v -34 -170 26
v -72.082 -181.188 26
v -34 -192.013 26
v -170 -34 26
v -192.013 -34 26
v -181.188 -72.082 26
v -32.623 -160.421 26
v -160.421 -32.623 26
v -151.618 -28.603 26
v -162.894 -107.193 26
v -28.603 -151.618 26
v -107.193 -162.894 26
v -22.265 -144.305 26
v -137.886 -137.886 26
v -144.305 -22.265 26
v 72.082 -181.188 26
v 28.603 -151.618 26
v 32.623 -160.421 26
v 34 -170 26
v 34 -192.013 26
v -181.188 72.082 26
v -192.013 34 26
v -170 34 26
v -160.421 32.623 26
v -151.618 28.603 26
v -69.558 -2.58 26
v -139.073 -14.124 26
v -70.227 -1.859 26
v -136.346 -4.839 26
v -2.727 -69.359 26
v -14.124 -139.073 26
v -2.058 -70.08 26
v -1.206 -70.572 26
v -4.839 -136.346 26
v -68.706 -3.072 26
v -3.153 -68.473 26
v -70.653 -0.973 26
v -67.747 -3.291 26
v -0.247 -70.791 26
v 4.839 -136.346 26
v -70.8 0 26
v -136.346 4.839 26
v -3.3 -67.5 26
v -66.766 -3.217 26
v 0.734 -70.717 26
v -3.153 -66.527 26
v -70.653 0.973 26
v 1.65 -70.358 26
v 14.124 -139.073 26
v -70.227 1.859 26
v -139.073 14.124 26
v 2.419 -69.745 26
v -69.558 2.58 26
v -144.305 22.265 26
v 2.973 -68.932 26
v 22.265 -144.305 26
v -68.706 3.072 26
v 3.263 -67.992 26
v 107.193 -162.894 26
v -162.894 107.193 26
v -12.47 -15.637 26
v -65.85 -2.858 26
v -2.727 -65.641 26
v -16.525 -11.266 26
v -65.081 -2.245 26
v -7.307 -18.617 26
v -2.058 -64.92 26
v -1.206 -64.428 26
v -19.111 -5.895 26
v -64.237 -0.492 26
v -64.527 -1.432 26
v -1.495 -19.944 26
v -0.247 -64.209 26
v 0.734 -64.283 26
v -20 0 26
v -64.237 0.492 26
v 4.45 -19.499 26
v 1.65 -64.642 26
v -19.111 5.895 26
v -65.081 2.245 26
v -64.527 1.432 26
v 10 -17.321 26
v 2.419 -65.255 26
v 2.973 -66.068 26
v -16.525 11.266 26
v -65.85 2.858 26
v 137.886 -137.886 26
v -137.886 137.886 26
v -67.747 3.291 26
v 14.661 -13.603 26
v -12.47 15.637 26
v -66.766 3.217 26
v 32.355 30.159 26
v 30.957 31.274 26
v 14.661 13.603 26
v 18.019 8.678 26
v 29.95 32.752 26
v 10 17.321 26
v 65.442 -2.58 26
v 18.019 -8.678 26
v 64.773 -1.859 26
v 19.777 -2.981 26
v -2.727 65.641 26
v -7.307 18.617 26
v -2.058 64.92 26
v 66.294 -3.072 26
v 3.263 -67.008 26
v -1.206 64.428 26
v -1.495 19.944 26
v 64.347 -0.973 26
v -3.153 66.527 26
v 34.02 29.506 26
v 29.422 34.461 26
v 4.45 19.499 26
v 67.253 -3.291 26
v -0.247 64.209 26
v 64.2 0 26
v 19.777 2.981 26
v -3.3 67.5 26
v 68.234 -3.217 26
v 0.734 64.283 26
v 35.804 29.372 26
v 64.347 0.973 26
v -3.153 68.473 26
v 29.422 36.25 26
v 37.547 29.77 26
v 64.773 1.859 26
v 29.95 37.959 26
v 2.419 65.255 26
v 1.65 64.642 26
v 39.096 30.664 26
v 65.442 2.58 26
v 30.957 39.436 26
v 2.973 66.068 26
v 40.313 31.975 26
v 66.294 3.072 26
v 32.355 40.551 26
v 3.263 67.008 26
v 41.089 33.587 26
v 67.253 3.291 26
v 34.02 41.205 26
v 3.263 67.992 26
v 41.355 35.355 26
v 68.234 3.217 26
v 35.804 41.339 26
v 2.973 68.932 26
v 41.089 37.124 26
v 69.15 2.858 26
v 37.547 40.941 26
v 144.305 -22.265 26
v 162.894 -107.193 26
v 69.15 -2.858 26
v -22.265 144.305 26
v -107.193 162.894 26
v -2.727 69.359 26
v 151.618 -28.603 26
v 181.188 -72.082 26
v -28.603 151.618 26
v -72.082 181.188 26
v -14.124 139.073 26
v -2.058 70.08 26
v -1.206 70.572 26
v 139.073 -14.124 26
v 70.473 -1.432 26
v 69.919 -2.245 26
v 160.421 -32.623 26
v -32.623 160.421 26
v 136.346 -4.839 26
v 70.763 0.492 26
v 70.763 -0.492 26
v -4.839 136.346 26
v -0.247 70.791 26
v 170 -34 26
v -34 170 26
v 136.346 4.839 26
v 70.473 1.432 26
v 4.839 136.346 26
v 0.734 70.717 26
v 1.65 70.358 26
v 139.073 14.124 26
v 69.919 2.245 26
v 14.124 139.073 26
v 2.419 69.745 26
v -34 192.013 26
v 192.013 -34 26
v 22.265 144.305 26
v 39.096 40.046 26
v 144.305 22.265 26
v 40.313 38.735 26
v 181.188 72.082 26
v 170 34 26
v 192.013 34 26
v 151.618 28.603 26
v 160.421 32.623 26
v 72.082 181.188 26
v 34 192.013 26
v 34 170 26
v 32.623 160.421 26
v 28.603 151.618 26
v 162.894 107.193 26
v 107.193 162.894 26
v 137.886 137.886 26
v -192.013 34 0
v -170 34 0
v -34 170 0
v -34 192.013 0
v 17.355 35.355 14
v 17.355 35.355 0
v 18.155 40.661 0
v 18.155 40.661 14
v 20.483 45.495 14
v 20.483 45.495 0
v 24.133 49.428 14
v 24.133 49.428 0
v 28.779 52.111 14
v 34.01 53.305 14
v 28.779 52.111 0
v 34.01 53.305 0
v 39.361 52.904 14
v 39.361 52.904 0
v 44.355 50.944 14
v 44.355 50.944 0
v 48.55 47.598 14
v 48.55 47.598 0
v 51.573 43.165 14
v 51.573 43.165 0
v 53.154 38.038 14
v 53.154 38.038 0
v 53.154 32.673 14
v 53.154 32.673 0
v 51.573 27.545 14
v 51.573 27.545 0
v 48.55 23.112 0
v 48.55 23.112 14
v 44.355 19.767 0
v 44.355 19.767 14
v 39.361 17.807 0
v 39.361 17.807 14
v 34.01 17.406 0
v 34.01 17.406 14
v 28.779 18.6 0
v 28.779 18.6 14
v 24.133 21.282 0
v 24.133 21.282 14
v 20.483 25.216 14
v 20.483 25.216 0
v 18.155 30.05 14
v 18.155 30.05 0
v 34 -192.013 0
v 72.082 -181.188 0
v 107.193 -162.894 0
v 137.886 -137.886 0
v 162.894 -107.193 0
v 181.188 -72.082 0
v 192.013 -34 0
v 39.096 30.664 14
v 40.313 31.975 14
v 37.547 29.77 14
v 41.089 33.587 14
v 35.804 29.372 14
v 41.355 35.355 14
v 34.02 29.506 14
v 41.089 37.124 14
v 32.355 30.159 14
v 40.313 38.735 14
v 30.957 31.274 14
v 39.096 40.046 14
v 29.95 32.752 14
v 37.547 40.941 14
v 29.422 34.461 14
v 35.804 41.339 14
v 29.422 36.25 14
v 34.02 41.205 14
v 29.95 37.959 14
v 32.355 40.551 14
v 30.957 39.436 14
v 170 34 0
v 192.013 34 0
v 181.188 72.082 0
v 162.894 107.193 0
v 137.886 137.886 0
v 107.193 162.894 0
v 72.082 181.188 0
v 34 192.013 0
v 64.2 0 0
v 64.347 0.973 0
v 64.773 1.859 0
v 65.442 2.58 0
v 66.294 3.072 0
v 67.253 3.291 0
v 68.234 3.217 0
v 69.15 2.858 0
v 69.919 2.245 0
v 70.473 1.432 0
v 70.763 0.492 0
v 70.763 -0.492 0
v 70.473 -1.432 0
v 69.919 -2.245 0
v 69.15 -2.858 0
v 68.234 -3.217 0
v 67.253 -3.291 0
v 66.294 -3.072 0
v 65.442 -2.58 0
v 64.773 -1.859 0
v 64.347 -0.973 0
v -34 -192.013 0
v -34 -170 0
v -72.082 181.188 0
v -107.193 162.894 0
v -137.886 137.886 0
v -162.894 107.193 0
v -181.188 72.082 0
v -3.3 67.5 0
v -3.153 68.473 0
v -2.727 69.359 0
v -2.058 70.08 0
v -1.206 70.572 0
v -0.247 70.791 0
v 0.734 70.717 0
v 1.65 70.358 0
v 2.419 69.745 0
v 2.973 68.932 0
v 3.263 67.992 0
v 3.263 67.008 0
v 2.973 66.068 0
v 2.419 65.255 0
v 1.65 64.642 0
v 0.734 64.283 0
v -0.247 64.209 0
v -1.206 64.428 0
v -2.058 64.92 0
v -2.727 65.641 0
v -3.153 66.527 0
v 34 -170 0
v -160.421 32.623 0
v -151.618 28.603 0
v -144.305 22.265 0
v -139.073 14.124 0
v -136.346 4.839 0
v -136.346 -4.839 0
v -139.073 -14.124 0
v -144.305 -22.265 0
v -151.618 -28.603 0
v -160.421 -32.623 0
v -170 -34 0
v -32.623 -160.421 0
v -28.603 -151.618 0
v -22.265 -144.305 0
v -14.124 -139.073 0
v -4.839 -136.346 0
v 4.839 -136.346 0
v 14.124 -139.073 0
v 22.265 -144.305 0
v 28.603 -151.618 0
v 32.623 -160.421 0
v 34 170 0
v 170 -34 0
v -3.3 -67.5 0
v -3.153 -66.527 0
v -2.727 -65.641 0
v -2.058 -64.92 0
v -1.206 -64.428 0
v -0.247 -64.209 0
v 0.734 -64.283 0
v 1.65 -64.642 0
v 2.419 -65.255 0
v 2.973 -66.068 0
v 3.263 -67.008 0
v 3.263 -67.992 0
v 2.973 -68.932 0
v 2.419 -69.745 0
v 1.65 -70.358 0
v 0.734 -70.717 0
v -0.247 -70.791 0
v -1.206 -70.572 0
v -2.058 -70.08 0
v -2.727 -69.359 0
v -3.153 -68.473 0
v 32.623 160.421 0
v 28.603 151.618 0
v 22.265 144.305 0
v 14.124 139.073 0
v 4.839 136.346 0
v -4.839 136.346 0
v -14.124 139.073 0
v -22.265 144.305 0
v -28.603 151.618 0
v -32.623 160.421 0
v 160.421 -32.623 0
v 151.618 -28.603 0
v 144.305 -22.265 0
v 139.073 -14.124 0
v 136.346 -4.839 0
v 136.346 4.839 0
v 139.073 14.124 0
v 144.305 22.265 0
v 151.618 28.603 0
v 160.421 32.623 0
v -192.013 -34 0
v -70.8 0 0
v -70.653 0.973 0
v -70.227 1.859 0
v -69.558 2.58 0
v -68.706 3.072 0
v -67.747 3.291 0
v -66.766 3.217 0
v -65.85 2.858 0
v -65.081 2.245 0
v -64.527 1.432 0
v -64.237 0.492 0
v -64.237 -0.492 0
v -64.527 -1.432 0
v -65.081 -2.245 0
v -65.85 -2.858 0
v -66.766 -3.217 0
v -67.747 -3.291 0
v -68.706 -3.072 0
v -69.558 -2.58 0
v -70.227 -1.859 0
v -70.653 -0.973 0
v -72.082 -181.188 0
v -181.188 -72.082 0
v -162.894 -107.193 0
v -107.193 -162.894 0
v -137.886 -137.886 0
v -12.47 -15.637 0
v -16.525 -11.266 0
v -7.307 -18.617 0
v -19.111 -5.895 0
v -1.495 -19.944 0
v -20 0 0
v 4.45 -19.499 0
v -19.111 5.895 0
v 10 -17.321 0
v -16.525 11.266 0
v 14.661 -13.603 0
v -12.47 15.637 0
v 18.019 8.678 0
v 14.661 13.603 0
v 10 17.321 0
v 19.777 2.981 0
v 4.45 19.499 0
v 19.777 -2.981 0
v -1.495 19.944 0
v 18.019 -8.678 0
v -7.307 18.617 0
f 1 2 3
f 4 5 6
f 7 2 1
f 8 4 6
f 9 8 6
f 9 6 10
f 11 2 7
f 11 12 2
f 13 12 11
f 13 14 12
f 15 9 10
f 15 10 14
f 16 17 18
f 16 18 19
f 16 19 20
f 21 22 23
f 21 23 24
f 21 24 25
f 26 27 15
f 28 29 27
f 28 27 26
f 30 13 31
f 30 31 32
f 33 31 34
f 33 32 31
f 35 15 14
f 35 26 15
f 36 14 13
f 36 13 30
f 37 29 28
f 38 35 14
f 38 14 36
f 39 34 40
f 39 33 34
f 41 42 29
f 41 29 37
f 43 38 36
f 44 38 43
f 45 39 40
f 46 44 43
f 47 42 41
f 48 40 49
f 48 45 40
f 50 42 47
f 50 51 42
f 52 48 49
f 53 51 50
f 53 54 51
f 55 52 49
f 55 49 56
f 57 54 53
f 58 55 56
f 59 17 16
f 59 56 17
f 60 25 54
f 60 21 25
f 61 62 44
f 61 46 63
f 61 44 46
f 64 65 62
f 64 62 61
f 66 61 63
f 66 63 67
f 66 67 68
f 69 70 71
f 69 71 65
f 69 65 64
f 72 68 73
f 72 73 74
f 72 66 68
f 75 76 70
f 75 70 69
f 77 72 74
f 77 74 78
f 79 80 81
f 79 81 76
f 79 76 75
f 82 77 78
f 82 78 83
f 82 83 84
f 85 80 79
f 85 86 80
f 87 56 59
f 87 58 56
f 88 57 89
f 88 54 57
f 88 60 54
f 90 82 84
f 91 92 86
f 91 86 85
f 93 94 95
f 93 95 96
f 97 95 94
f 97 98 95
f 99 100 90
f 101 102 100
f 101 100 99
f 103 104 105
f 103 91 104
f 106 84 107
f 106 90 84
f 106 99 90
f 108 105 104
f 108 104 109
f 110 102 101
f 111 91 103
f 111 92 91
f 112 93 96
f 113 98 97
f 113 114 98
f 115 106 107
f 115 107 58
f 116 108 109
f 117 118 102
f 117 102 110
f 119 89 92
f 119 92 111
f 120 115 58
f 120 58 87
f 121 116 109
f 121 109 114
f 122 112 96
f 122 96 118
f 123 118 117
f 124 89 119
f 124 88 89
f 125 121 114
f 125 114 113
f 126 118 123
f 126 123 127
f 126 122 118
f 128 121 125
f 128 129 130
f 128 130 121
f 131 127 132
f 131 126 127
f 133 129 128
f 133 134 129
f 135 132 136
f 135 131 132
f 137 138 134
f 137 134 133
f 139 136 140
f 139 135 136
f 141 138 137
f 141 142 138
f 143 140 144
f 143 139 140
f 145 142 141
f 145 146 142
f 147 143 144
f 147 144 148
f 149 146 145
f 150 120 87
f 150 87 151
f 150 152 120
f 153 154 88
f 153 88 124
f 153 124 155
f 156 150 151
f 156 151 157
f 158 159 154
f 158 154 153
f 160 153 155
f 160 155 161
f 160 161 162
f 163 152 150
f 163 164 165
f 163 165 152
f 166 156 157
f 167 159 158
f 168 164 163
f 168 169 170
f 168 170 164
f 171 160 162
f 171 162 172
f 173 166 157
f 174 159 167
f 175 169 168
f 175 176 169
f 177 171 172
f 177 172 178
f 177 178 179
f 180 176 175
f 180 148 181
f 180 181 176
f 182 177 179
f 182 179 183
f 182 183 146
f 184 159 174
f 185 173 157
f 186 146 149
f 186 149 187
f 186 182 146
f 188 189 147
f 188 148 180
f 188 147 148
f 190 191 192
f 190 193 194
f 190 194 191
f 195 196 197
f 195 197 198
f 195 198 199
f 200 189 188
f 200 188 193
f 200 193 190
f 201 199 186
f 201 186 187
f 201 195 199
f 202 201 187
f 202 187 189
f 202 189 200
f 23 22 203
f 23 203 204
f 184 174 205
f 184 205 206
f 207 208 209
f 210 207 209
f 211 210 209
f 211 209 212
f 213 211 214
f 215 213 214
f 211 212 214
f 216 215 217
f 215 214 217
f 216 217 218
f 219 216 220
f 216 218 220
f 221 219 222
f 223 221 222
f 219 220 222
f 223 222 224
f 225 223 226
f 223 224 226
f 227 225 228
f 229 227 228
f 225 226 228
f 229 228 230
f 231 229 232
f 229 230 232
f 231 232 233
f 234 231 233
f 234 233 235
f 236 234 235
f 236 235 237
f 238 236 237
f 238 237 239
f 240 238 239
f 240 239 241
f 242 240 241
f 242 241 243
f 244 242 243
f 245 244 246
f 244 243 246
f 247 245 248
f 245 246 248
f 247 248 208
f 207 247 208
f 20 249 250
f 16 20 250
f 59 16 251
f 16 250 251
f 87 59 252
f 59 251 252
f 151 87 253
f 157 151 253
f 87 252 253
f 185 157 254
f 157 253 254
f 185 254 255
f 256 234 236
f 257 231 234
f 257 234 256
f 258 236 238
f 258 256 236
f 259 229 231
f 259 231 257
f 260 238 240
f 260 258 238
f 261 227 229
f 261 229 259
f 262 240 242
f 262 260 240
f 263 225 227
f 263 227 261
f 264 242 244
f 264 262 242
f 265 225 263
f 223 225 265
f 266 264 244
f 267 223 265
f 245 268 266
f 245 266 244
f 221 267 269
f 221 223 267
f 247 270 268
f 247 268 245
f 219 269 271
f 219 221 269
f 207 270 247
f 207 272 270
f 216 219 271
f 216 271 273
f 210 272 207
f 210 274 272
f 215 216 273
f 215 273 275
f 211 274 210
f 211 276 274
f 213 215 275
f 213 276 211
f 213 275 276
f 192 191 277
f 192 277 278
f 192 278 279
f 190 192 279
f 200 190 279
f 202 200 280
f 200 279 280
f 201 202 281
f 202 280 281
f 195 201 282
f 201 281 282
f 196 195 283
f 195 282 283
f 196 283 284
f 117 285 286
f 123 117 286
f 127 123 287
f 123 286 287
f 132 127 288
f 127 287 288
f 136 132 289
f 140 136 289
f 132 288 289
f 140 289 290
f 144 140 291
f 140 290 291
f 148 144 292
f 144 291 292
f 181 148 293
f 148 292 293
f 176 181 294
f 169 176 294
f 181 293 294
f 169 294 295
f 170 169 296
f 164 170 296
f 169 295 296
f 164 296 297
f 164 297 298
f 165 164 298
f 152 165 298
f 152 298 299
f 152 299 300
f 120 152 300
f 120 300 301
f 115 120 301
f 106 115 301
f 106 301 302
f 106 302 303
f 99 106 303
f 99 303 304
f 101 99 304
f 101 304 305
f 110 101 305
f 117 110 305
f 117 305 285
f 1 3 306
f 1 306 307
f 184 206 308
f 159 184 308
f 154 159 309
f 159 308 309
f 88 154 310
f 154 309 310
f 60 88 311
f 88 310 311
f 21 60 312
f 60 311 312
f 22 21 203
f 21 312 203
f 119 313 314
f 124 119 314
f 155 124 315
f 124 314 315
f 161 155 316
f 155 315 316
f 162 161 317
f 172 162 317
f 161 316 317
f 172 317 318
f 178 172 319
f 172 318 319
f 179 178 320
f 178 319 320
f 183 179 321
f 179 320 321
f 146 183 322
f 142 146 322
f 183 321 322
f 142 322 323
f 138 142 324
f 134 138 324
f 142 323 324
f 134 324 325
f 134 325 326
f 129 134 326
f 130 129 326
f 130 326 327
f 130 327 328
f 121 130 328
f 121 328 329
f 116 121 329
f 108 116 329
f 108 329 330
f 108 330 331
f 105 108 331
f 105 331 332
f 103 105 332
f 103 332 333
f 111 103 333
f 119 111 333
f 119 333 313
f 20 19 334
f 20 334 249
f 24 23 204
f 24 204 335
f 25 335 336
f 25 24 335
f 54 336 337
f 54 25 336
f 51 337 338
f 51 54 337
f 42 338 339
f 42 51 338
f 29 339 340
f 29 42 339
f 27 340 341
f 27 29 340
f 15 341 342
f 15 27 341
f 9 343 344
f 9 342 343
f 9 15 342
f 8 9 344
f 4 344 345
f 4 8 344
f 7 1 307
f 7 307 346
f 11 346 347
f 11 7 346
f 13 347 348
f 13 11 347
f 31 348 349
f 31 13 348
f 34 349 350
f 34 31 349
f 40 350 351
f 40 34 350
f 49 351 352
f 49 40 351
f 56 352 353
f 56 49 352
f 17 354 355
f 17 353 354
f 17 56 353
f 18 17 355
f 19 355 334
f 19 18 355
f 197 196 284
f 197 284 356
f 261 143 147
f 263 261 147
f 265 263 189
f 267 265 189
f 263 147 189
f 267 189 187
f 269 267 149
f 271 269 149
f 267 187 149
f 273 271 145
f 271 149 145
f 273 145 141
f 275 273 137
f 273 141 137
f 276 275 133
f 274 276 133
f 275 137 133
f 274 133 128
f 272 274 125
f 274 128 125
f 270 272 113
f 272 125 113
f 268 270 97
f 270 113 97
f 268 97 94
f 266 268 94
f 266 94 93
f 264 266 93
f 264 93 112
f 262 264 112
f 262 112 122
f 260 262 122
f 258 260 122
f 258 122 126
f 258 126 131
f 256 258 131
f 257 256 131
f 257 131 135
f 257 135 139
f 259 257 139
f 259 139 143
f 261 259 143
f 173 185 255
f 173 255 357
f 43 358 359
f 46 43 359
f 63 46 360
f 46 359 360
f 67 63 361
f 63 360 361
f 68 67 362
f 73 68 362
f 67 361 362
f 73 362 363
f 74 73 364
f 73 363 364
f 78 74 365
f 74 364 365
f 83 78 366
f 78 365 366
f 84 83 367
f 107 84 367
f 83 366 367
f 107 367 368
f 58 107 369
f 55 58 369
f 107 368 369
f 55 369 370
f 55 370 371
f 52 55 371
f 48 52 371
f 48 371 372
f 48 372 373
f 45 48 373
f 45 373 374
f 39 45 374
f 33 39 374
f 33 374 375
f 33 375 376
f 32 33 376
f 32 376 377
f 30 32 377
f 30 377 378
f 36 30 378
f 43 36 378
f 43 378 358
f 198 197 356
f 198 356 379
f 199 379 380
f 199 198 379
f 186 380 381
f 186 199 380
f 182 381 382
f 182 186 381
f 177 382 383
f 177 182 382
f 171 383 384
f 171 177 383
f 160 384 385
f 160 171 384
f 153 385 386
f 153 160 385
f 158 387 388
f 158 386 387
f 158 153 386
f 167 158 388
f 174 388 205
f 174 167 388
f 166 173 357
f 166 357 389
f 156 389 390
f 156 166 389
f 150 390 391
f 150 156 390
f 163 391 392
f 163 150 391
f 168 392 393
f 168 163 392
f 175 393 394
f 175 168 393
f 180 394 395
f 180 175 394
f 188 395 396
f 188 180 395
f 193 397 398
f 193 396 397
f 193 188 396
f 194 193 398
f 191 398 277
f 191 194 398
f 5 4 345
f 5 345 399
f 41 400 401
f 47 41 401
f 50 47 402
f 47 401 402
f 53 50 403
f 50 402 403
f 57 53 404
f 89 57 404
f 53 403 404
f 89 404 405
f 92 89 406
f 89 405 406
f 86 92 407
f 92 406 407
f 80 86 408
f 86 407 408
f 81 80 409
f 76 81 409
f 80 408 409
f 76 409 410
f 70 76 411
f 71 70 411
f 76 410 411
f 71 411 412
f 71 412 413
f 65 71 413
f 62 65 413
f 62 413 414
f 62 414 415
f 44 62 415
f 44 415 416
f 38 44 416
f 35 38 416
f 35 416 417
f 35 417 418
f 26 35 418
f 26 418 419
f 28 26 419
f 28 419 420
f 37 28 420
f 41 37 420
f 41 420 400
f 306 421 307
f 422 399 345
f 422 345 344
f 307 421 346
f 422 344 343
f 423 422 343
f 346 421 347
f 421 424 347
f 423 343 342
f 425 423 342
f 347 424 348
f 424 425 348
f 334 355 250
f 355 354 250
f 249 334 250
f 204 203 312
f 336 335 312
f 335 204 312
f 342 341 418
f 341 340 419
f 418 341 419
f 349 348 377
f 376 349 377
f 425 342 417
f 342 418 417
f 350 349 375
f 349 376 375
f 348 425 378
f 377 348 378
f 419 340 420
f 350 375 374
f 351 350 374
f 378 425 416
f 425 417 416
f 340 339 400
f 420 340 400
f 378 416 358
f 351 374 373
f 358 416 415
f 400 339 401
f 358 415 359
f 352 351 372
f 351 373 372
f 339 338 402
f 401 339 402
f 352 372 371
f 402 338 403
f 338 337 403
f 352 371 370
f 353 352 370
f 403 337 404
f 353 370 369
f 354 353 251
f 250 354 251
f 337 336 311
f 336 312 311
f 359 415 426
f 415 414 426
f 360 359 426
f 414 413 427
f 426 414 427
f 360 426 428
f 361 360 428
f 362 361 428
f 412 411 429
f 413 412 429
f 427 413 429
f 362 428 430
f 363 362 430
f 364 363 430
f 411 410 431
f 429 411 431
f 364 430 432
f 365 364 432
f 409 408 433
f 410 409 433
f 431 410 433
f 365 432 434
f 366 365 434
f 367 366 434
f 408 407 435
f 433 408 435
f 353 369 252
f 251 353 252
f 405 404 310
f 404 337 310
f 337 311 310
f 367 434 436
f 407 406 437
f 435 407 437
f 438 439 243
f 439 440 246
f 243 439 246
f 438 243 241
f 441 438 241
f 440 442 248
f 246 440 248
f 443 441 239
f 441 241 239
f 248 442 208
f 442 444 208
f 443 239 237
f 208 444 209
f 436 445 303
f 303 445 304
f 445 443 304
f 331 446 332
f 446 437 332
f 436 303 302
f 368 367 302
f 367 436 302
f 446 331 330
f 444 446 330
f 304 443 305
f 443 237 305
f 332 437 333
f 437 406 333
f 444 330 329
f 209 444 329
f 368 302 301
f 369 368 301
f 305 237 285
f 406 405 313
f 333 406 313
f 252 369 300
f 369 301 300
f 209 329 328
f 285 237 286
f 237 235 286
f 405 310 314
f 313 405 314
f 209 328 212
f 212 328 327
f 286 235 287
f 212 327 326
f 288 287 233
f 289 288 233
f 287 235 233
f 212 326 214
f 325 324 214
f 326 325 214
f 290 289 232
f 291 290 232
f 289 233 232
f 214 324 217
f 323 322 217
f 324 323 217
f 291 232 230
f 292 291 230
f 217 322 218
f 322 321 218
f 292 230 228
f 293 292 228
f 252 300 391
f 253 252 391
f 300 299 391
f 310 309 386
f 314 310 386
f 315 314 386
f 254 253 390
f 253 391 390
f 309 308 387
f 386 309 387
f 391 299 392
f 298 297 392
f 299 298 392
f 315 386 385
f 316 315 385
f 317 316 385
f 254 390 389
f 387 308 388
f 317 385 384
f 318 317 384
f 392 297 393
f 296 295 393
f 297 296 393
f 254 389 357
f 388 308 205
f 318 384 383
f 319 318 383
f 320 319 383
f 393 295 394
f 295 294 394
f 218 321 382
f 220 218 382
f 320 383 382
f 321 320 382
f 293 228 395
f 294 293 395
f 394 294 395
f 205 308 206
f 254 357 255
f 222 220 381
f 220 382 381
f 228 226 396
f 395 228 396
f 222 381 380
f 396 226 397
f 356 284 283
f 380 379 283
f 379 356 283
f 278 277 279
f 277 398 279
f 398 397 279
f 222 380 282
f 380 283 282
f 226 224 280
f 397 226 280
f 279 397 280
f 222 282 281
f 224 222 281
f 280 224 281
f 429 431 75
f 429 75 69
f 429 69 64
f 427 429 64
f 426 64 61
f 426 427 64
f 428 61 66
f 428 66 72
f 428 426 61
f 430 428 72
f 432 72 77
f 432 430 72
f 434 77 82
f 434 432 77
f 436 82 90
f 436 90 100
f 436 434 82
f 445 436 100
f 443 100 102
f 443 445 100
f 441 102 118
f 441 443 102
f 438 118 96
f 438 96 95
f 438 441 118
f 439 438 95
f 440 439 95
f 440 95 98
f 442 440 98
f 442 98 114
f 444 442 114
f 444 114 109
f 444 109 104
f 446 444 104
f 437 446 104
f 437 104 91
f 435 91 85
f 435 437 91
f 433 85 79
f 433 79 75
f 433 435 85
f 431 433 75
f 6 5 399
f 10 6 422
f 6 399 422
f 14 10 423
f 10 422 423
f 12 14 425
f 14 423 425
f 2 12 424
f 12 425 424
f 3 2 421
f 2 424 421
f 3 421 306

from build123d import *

# Parameters (mm, degrees)
ESQUISSE1_R             = 195
ESQUISSE1_R_2           = 20
BASE_EXTRUSION_DEPTH    = 26
ENL_V_MAT_EXTRU_1_DEPTH = 277.994584785
PER_AGE1_D              = 6.6
ESQUISSE5_R             = 6
ENL_V_MAT_EXTRU_2_DEPTH = 273.789295978
ESQUISSE6_R             = 18
ENL_V_MAT_EXTRU_3_DEPTH = 14


with BuildPart() as part:
    # Esquisse1 → Base-Extrusion (new body)
    with BuildSketch(Plane.XY):
        Circle(ESQUISSE1_R)
        with Locations(Location((0, 0, 0), (0, 0, 180))):
            Circle(ESQUISSE1_R_2, mode=Mode.SUBTRACT)
    extrude(amount=BASE_EXTRUSION_DEPTH)

    # Esquisse2 → Enlèv. mat.-Extru.1 (cut, through all)
    with BuildSketch(Plane.XY.offset(26)):
        with BuildLine():
            Line((170, 34), (192.013020392, 34))
            ThreePointArc((192.013020392, 34), (195, 0), (192.013020392, -34))
            Line((192.013020392, -34), (170, -34))
            ThreePointArc((170, -34), (136, 0), (170, 34))
        make_face()
        with BuildLine():
            Line((34, -170), (34, -192.013020392))
            ThreePointArc((34, -192.013020392), (0, -195), (-34, -192.013020392))
            Line((-34, -192.013020392), (-34, -170))
            ThreePointArc((-34, -170), (0, -136), (34, -170))
        make_face()
        with BuildLine():
            Line((-170, -34), (-192.013020392, -34))
            ThreePointArc((-192.013020392, -34), (-195, 0), (-192.013020392, 34))
            Line((-192.013020392, 34), (-170, 34))
            ThreePointArc((-170, 34), (-136, 0), (-170, -34))
        make_face()
        with BuildLine():
            Line((-34, 170), (-34, 192.013020392))
            ThreePointArc((-34, 192.013020392), (0, 195), (34, 192.013020392))
            Line((34, 192.013020392), (34, 170))
            ThreePointArc((34, 170), (0, 136), (-34, 170))
        make_face()
    extrude(amount=-ENL_V_MAT_EXTRU_1_DEPTH, mode=Mode.SUBTRACT)

    # Perçage1 (through all)
    with Locations(Plane.XY.offset(26)):
        with Locations((0, 67.5), (67.5, 0), (0, -67.5), (-67.5, 0)):
            Hole(PER_AGE1_D / 2)

    # Esquisse5 → Enlèv. mat.-Extru.2 (cut, through all)
    with BuildSketch(Plane.XY.offset(26)):
        with Locations((35.355339059, 35.355339059)):
            Circle(ESQUISSE5_R)
    extrude(amount=-ENL_V_MAT_EXTRU_2_DEPTH, mode=Mode.SUBTRACT)

    # Esquisse6 → Enlèv. mat.-Extru.3 (cut)
    with BuildSketch(Plane(origin=(0, 0, 0), x_dir=(-1, 0, 0), z_dir=(0, 0, -1))):
        with Locations((-35.355339059, 35.355339059)):
            Circle(ESQUISSE6_R)
    extrude(amount=-ENL_V_MAT_EXTRU_3_DEPTH, mode=Mode.SUBTRACT)


solid = part.part
